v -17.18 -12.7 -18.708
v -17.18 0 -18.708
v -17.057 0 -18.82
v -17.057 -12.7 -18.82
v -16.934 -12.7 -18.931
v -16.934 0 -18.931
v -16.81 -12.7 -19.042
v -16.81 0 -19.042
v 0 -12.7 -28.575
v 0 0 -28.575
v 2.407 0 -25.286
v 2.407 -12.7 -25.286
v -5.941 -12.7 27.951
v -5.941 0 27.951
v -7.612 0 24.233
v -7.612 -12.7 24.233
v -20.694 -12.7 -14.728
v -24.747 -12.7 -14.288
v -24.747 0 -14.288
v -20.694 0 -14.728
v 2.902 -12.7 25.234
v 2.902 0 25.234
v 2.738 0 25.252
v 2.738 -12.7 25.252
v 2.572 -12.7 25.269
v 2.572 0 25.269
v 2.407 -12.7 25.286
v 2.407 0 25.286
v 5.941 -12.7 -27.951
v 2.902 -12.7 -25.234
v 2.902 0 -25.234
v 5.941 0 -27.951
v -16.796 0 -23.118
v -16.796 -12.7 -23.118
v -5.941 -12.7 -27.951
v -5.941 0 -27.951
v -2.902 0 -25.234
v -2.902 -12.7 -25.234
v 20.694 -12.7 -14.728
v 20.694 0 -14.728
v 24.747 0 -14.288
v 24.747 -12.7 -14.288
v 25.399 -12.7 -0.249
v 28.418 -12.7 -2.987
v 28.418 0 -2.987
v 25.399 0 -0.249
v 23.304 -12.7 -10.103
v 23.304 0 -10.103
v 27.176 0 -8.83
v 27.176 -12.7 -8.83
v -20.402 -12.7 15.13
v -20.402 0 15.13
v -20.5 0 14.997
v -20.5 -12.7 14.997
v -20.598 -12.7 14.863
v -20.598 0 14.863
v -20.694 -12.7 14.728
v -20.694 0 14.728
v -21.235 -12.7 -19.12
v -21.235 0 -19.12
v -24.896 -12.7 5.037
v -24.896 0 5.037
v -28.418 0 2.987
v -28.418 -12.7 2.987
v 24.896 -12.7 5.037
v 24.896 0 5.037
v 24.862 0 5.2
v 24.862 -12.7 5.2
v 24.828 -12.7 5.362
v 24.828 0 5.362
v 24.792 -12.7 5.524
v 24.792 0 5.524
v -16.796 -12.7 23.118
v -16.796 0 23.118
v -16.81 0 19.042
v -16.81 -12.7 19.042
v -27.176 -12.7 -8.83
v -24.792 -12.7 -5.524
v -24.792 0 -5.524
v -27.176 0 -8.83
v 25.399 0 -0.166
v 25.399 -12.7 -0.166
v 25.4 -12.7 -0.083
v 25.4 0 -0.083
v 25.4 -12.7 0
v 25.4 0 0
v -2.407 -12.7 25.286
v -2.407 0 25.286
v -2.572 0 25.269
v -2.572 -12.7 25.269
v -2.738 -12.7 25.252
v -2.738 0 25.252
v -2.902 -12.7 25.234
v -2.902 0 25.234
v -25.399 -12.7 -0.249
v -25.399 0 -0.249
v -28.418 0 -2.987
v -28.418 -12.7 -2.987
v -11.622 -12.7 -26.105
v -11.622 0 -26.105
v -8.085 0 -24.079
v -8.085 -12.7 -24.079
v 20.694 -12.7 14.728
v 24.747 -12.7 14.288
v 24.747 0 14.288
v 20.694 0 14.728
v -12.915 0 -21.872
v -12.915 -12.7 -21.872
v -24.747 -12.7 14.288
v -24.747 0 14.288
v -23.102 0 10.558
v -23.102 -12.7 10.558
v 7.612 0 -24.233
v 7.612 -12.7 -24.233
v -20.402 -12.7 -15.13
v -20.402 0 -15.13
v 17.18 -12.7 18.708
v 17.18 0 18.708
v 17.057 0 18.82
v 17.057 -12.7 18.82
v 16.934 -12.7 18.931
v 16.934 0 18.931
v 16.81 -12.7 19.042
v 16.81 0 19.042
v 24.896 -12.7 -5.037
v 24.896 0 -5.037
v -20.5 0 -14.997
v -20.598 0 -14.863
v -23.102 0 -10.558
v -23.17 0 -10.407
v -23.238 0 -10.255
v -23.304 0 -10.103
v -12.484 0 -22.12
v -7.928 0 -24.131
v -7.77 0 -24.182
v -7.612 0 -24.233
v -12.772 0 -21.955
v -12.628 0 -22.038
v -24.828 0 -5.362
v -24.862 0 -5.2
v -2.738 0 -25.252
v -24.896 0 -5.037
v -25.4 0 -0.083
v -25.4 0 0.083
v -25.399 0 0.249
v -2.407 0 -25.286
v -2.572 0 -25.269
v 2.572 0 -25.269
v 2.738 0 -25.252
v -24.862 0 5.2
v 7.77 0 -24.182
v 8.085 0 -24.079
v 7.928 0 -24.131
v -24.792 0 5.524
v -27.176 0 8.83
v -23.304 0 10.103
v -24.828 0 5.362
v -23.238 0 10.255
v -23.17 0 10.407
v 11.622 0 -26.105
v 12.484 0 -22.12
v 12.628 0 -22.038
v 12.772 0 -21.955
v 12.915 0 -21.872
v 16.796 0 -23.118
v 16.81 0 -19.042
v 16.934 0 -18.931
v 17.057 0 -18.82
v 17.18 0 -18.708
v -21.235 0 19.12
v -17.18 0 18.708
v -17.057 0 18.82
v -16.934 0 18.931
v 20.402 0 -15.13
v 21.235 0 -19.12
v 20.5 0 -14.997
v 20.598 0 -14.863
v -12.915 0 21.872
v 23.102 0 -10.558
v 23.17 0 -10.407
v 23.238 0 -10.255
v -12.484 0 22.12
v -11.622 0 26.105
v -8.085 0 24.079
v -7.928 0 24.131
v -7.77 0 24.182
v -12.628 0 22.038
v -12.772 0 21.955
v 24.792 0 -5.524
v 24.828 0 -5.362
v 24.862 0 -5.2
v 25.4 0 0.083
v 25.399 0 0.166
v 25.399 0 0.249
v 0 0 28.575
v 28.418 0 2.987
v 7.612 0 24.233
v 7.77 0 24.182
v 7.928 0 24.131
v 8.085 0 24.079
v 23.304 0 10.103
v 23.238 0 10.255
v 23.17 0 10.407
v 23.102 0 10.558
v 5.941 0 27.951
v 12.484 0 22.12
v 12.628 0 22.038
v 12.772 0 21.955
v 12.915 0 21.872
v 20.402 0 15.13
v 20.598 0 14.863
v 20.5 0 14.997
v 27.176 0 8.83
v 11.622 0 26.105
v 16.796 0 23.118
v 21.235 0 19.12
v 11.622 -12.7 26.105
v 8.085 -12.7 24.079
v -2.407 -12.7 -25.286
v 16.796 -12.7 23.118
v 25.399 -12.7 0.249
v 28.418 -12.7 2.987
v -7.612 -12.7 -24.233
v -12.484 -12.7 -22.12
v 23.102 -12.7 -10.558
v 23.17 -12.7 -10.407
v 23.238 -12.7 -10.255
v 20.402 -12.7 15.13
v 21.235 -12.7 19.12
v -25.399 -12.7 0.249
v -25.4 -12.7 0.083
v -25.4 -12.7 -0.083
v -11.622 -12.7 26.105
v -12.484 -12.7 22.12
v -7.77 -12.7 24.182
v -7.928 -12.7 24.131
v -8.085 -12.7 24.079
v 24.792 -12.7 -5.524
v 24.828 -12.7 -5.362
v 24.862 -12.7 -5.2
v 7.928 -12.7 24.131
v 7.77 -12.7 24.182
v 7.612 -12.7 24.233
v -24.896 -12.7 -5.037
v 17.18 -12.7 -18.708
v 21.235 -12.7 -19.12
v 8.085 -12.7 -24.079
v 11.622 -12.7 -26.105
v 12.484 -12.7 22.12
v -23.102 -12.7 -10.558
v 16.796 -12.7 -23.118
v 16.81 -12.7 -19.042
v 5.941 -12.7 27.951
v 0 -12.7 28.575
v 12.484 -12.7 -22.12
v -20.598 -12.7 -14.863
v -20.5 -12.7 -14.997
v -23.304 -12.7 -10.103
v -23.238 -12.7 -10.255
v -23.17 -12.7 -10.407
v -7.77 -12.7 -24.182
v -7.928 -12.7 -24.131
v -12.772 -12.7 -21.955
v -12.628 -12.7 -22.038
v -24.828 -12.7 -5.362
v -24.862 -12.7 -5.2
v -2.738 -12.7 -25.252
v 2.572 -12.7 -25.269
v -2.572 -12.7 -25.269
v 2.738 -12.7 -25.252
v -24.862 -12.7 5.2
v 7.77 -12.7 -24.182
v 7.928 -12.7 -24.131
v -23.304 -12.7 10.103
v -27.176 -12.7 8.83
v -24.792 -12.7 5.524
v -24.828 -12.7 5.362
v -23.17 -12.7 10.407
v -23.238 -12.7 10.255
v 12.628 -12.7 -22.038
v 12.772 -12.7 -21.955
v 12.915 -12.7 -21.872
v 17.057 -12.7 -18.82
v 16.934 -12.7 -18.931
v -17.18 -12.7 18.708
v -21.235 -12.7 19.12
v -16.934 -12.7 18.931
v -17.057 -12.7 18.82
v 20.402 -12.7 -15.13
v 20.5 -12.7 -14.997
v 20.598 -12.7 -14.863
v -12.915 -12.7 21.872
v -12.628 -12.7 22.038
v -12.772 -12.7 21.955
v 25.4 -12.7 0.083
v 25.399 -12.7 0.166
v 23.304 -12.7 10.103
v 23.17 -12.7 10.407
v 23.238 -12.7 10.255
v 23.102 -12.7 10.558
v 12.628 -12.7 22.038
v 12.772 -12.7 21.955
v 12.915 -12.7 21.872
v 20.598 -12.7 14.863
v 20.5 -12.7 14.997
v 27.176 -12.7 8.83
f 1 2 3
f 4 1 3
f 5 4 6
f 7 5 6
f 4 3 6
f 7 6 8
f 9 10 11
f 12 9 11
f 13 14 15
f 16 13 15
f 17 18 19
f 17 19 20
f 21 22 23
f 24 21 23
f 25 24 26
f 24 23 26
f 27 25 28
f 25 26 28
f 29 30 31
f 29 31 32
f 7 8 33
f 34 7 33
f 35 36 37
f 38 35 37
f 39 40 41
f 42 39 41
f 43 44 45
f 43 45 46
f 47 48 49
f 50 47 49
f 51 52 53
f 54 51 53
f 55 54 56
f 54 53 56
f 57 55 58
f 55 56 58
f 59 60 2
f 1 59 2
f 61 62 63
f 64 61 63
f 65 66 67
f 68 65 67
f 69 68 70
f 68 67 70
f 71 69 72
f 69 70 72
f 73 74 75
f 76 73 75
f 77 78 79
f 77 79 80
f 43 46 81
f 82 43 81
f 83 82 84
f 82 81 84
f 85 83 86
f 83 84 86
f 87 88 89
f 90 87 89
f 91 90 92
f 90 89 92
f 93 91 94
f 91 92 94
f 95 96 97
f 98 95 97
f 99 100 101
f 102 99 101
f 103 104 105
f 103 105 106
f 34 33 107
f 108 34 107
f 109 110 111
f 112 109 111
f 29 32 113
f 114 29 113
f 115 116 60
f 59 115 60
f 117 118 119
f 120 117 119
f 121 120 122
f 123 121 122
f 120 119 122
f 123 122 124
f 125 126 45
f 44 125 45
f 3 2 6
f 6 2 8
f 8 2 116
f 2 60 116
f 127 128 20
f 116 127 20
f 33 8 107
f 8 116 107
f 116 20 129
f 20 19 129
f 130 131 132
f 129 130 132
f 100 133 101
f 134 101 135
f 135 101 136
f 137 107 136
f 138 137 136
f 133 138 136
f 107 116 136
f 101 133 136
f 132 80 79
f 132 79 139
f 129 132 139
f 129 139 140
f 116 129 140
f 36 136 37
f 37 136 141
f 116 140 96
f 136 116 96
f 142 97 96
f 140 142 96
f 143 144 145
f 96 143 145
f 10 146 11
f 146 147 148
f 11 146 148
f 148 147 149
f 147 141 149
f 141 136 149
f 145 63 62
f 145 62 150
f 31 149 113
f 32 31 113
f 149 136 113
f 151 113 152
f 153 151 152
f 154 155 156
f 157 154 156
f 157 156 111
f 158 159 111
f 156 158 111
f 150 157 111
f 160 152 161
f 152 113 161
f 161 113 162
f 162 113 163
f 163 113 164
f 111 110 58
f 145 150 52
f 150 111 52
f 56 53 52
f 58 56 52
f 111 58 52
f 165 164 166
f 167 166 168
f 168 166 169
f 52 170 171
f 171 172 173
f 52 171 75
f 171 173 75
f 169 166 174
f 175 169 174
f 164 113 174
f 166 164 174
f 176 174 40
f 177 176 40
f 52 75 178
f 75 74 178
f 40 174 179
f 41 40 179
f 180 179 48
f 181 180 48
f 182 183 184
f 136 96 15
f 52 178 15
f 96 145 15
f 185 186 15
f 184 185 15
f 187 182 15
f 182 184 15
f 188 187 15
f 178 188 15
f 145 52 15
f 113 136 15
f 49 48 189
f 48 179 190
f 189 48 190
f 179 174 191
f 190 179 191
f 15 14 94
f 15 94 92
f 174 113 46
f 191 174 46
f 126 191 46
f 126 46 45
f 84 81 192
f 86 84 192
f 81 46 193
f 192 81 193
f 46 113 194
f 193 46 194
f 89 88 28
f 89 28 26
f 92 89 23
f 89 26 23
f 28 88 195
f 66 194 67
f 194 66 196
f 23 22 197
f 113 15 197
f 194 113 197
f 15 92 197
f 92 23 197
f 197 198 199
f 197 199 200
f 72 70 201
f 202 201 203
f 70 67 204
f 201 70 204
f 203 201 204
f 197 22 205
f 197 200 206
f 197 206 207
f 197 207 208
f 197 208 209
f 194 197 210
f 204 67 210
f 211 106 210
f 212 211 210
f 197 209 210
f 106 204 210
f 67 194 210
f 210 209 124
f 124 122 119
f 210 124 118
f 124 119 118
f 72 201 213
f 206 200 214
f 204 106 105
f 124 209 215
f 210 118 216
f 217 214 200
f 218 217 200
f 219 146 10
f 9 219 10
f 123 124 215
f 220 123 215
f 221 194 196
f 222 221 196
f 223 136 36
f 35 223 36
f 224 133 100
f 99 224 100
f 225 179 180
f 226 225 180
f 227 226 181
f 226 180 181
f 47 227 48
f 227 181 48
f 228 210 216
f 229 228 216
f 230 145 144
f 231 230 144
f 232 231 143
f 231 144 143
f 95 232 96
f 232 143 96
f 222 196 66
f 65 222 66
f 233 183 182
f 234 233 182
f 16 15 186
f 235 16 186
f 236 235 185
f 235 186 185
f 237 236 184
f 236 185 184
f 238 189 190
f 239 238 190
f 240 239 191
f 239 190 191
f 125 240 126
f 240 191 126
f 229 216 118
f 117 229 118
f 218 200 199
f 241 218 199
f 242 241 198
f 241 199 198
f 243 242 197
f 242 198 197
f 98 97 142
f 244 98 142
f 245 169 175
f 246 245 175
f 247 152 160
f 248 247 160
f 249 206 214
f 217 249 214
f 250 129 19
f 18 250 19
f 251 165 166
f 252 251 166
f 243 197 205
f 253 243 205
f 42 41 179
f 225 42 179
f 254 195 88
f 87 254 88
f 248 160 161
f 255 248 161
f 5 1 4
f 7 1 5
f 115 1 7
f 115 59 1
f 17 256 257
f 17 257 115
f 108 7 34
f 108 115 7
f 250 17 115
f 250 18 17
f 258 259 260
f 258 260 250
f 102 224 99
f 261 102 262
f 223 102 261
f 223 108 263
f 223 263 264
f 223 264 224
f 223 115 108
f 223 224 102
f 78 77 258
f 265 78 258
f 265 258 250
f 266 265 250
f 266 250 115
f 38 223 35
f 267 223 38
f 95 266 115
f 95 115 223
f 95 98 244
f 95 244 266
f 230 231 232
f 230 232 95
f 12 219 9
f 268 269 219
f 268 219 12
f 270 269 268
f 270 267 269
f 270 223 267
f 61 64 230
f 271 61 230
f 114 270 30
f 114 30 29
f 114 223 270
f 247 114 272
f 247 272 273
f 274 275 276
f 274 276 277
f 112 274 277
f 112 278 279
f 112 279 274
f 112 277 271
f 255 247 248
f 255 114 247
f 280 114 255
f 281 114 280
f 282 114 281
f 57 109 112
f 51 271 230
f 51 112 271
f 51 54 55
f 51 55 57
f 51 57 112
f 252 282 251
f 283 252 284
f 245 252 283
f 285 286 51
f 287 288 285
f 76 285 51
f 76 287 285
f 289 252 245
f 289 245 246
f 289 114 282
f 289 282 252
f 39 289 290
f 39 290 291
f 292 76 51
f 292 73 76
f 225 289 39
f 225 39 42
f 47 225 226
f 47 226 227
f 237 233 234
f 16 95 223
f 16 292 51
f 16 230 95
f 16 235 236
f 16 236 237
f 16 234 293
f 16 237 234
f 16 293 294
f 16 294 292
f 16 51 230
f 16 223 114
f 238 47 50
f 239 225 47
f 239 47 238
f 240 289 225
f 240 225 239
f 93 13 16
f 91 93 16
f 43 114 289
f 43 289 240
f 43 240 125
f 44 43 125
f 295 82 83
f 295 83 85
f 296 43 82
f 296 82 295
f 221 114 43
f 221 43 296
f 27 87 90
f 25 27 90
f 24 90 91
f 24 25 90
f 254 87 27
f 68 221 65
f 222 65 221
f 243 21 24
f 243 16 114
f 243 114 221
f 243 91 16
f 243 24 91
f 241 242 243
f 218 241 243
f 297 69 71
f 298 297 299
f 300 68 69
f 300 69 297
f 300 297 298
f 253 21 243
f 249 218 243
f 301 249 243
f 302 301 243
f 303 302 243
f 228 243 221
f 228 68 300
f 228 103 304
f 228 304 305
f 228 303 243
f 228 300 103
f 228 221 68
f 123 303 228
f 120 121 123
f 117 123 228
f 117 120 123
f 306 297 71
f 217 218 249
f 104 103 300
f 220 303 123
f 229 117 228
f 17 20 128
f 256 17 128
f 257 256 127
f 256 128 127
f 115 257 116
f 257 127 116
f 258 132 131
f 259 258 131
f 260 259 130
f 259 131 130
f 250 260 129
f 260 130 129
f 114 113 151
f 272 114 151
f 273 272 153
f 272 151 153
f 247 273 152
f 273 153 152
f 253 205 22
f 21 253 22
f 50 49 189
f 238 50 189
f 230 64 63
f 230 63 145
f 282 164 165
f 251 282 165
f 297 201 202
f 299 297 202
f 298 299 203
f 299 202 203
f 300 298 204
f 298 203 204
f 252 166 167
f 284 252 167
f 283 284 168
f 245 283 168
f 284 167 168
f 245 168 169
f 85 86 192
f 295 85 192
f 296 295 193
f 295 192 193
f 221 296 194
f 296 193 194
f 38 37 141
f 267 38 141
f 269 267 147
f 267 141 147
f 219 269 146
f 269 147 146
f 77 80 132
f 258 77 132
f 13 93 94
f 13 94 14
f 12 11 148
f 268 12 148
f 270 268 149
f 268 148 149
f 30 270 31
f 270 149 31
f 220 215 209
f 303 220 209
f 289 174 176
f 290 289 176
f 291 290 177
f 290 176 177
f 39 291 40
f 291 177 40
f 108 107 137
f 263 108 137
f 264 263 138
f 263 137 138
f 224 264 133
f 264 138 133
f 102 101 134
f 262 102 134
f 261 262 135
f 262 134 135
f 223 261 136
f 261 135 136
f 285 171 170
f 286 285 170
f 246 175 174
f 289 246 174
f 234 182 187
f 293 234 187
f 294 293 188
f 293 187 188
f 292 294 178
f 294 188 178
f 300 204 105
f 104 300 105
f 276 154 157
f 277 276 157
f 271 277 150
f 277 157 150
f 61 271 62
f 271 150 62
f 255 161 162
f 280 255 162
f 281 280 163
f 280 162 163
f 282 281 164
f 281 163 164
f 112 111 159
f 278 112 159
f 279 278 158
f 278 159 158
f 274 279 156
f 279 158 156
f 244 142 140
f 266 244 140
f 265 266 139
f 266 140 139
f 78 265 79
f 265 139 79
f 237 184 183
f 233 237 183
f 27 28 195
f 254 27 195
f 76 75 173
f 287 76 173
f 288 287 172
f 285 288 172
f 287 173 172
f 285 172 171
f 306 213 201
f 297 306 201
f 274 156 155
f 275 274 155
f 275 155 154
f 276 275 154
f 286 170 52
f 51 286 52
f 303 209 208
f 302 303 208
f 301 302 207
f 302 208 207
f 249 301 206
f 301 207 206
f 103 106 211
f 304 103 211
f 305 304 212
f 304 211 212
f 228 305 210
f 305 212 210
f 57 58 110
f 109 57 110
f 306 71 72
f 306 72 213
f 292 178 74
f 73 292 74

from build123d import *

# Parameters (mm, degrees)
F1_DEPTH = 12.7


with BuildPart() as f1:
    # F0 (on Front) → F1 (new body)
    with BuildSketch(Plane.XZ):
        with BuildLine():
            ThreePointArc((25.39878, -0.248902), (25.399695, -0.124452), (25.4, 0))
            ThreePointArc((25.4, 0), (25.399695, 0.124452), (25.39878, 0.248902))
            ThreePointArc((25.39878, 0.248902), (25.260856, 2.655023), (24.895506, 5.037241))
            ThreePointArc((24.895506, 5.037241), (24.844949, 5.280957), (24.792007, 5.524166))
            ThreePointArc((24.792007, 5.524166), (24.156836, 7.849032), (23.304178, 10.103232))
            ThreePointArc((23.304178, 10.103232), (23.204055, 10.331111), (23.101703, 10.557998))
            ThreePointArc((23.101703, 10.557998), (21.997045, 12.7), (20.694346, 14.727663))
            ThreePointArc((20.694346, 14.727663), (20.549032, 14.929745), (20.401744, 15.130394))
            ThreePointArc((20.401744, 15.130394), (18.875879, 16.995917), (17.180071, 18.708425))
            ThreePointArc((17.180071, 18.708425), (16.995917, 18.875879), (16.810131, 19.04152))
            ThreePointArc((16.810131, 19.04152), (14.929745, 20.549032), (12.914945, 21.871538))
            ThreePointArc((12.914945, 21.871538), (12.7, 21.997045), (12.483835, 22.12044))
            ThreePointArc((12.483835, 22.12044), (10.331111, 23.204055), (8.085374, 24.078761))
            ThreePointArc((8.085374, 24.078761), (7.849032, 24.156836), (7.611935, 24.23259))
            ThreePointArc((7.611935, 24.23259), (5.280957, 24.844949), (2.902434, 25.233626))
            ThreePointArc((2.902434, 25.233626), (2.655023, 25.260856), (2.407357, 25.285661))
            ThreePointArc((2.407357, 25.285661), (0, 25.4), (-2.407357, 25.285661))
            ThreePointArc((-2.407357, 25.285661), (-2.655023, 25.260856), (-2.902434, 25.233626))
            ThreePointArc((-2.902434, 25.233626), (-5.280957, 24.844949), (-7.611935, 24.23259))
            ThreePointArc((-7.611935, 24.23259), (-7.849032, 24.156836), (-8.085374, 24.078761))
            ThreePointArc((-8.085374, 24.078761), (-10.331111, 23.204055), (-12.483835, 22.12044))
            ThreePointArc((-12.483835, 22.12044), (-12.7, 21.997045), (-12.914945, 21.871538))
            ThreePointArc((-12.914945, 21.871538), (-14.929745, 20.549032), (-16.810131, 19.04152))
            ThreePointArc((-16.810131, 19.04152), (-16.995917, 18.875879), (-17.180071, 18.708425))
            ThreePointArc((-17.180071, 18.708425), (-18.875879, 16.995917), (-20.401744, 15.130394))
            ThreePointArc((-20.401744, 15.130394), (-20.549032, 14.929745), (-20.694346, 14.727663))
            ThreePointArc((-20.694346, 14.727663), (-21.997045, 12.7), (-23.101703, 10.557998))
            ThreePointArc((-23.101703, 10.557998), (-23.204055, 10.331111), (-23.304178, 10.103232))
            ThreePointArc((-23.304178, 10.103232), (-24.156836, 7.849032), (-24.792007, 5.524166))
            ThreePointArc((-24.792007, 5.524166), (-24.844949, 5.280957), (-24.895506, 5.037241))
            ThreePointArc((-24.895506, 5.037241), (-25.260856, 2.655023), (-25.39878, 0.248902))
            ThreePointArc((-25.39878, 0.248902), (-25.4, 0), (-25.39878, -0.248902))
            ThreePointArc((-25.39878, -0.248902), (-25.260856, -2.655023), (-24.895506, -5.037241))
            ThreePointArc((-24.895506, -5.037241), (-24.844949, -5.280957), (-24.792007, -5.524166))
            ThreePointArc((-24.792007, -5.524166), (-24.156836, -7.849032), (-23.304178, -10.103232))
            ThreePointArc((-23.304178, -10.103232), (-23.204055, -10.331111), (-23.101703, -10.557998))
            ThreePointArc((-23.101703, -10.557998), (-21.997045, -12.7), (-20.694346, -14.727663))
            ThreePointArc((-20.694346, -14.727663), (-20.549032, -14.929745), (-20.401744, -15.130394))
            ThreePointArc((-20.401744, -15.130394), (-18.875879, -16.995917), (-17.180071, -18.708425))
            ThreePointArc((-17.180071, -18.708425), (-16.995917, -18.875879), (-16.810131, -19.04152))
            ThreePointArc((-16.810131, -19.04152), (-14.929745, -20.549032), (-12.914945, -21.871538))
            ThreePointArc((-12.914945, -21.871538), (-12.7, -21.997045), (-12.483835, -22.12044))
            ThreePointArc((-12.483835, -22.12044), (-10.331111, -23.204055), (-8.085374, -24.078761))
            ThreePointArc((-8.085374, -24.078761), (-7.849032, -24.156836), (-7.611935, -24.23259))
            ThreePointArc((-7.611935, -24.23259), (-5.280957, -24.844949), (-2.902434, -25.233626))
            ThreePointArc((-2.902434, -25.233626), (-2.655023, -25.260856), (-2.407357, -25.285661))
            ThreePointArc((-2.407357, -25.285661), (0, -25.4), (2.407357, -25.285661))
            ThreePointArc((2.407357, -25.285661), (2.655023, -25.260856), (2.902434, -25.233626))
            ThreePointArc((2.902434, -25.233626), (5.280957, -24.844949), (7.611935, -24.23259))
            ThreePointArc((7.611935, -24.23259), (7.849032, -24.156836), (8.085374, -24.078761))
            ThreePointArc((8.085374, -24.078761), (10.331111, -23.204055), (12.483835, -22.12044))
            ThreePointArc((12.483835, -22.12044), (12.7, -21.997045), (12.914945, -21.871538))
            ThreePointArc((12.914945, -21.871538), (14.929745, -20.549032), (16.810131, -19.04152))
            ThreePointArc((16.810131, -19.04152), (16.995917, -18.875879), (17.180071, -18.708425))
            ThreePointArc((17.180071, -18.708425), (18.875879, -16.995917), (20.401744, -15.130394))
            ThreePointArc((20.401744, -15.130394), (20.549032, -14.929745), (20.694346, -14.727663))
            ThreePointArc((20.694346, -14.727663), (21.997045, -12.7), (23.101703, -10.557998))
            ThreePointArc((23.101703, -10.557998), (23.204055, -10.331111), (23.304178, -10.103232))
            ThreePointArc((23.304178, -10.103232), (24.156836, -7.849032), (24.792007, -5.524166))
            ThreePointArc((24.792007, -5.524166), (24.844949, -5.280957), (24.895506, -5.037241))
            ThreePointArc((24.895506, -5.037241), (25.260856, -2.655023), (25.39878, -0.248902))
        make_face()
        with BuildLine():
            Line((-28.418463, -2.986901), (-24.895506, -5.037241))
            ThreePointArc((-24.895506, -5.037241), (-25.260856, -2.655023), (-25.39878, -0.248902))
            Line((-25.39878, -0.248902), (-28.418463, -2.986901))
        make_face()
        with BuildLine():
            ThreePointArc((-25.39878, 0.248902), (-25.260856, 2.655023), (-24.895506, 5.037241))
            Line((-24.895506, 5.037241), (-28.418463, 2.986901))
            Line((-28.418463, 2.986901), (-25.39878, 0.248902))
        make_face()
        with BuildLine():
            ThreePointArc((-24.792007, 5.524166), (-24.156836, 7.849032), (-23.304178, 10.103232))
            Line((-23.304178, 10.103232), (-27.17644, 8.830161))
            Line((-27.17644, 8.830161), (-24.792007, 5.524166))
        make_face()
        with BuildLine():
            ThreePointArc((-23.101703, 10.557998), (-21.997045, 12.7), (-20.694346, 14.727663))
            Line((-20.694346, 14.727663), (-24.746676, 14.2875))
            Line((-24.746676, 14.2875), (-23.101703, 10.557998))
        make_face()
        with BuildLine():
            ThreePointArc((-20.401744, 15.130394), (-18.875879, 16.995917), (-17.180071, 18.708425))
            Line((-17.180071, 18.708425), (-21.235363, 19.120407))
            Line((-21.235363, 19.120407), (-20.401744, 15.130394))
        make_face()
        with BuildLine():
            ThreePointArc((-16.810131, 19.04152), (-14.929745, 20.549032), (-12.914945, 21.871538))
            Line((-12.914945, 21.871538), (-16.795964, 23.117661))
            Line((-16.795964, 23.117661), (-16.810131, 19.04152))
        make_face()
        with BuildLine():
            ThreePointArc((-12.483835, 22.12044), (-10.331111, 23.204055), (-8.085374, 24.078761))
            Line((-8.085374, 24.078761), (-11.6225, 26.104561))
            Line((-11.6225, 26.104561), (-12.483835, 22.12044))
        make_face()
        with BuildLine():
            ThreePointArc((-7.611935, 24.23259), (-5.280957, 24.844949), (-2.902434, 25.233626))
            Line((-2.902434, 25.233626), (-5.941077, 27.950568))
            Line((-5.941077, 27.950568), (-7.611935, 24.23259))
        make_face()
        with BuildLine():
            ThreePointArc((-2.407357, 25.285661), (0, 25.4), (2.407357, 25.285661))
            Line((2.407357, 25.285661), (0, 28.575))
            Line((0, 28.575), (-2.407357, 25.285661))
        make_face()
        with BuildLine():
            ThreePointArc((2.902434, 25.233626), (5.280957, 24.844949), (7.611935, 24.23259))
            Line((7.611935, 24.23259), (5.941077, 27.950568))
            Line((5.941077, 27.950568), (2.902434, 25.233626))
        make_face()
        with BuildLine():
            ThreePointArc((12.914945, 21.871538), (14.929745, 20.549032), (16.810131, 19.04152))
            Line((16.810131, 19.04152), (16.795964, 23.117661))
            Line((16.795964, 23.117661), (12.914945, 21.871538))
        make_face()
        with BuildLine():
            ThreePointArc((17.180071, 18.708425), (18.875879, 16.995917), (20.401744, 15.130394))
            Line((20.401744, 15.130394), (21.235363, 19.120407))
            Line((21.235363, 19.120407), (17.180071, 18.708425))
        make_face()
        with BuildLine():
            ThreePointArc((20.694346, 14.727663), (21.997045, 12.7), (23.101703, 10.557998))
            Line((23.101703, 10.557998), (24.746676, 14.2875))
            Line((24.746676, 14.2875), (20.694346, 14.727663))
        make_face()
        with BuildLine():
            ThreePointArc((23.304178, 10.103232), (24.156836, 7.849032), (24.792007, 5.524166))
            Line((24.792007, 5.524166), (27.17644, 8.830161))
            Line((27.17644, 8.830161), (23.304178, 10.103232))
        make_face()
        with BuildLine():
            ThreePointArc((8.085374, 24.078761), (10.331111, 23.204055), (12.483835, 22.12044))
            Line((12.483835, 22.12044), (11.6225, 26.104561))
            Line((11.6225, 26.104561), (8.085374, 24.078761))
        make_face()
        with BuildLine():
            ThreePointArc((24.895506, 5.037241), (25.260856, 2.655023), (25.39878, 0.248902))
            Line((25.39878, 0.248902), (28.418463, 2.986901))
            Line((28.418463, 2.986901), (24.895506, 5.037241))
        make_face()
        with BuildLine():
            Line((28.418463, -2.986901), (25.39878, -0.248902))
            ThreePointArc((25.39878, -0.248902), (25.260856, -2.655023), (24.895506, -5.037241))
            Line((24.895506, -5.037241), (28.418463, -2.986901))
        make_face()
        with BuildLine():
            Line((27.17644, -8.830161), (24.792007, -5.524166))
            ThreePointArc((24.792007, -5.524166), (24.156836, -7.849032), (23.304178, -10.103232))
            Line((23.304178, -10.103232), (27.17644, -8.830161))
        make_face()
        with BuildLine():
            Line((24.746676, -14.2875), (23.101703, -10.557998))
            ThreePointArc((23.101703, -10.557998), (21.997045, -12.7), (20.694346, -14.727663))
            Line((20.694346, -14.727663), (24.746676, -14.2875))
        make_face()
        with BuildLine():
            Line((21.235363, -19.120407), (20.401744, -15.130394))
            ThreePointArc((20.401744, -15.130394), (18.875879, -16.995917), (17.180071, -18.708425))
            Line((17.180071, -18.708425), (21.235363, -19.120407))
        make_face()
        with BuildLine():
            Line((11.6225, -26.104561), (12.483835, -22.12044))
            ThreePointArc((12.483835, -22.12044), (10.331111, -23.204055), (8.085374, -24.078761))
            Line((8.085374, -24.078761), (11.6225, -26.104561))
        make_face()
        with BuildLine():
            Line((5.941077, -27.950568), (7.611935, -24.23259))
            ThreePointArc((7.611935, -24.23259), (5.280957, -24.844949), (2.902434, -25.233626))
            Line((2.902434, -25.233626), (5.941077, -27.950568))
        make_face()
        with BuildLine():
            Line((0, -28.575), (2.407357, -25.285661))
            ThreePointArc((2.407357, -25.285661), (0, -25.4), (-2.407357, -25.285661))
            Line((-2.407357, -25.285661), (0, -28.575))
        make_face()
        with BuildLine():
            Line((-5.941077, -27.950568), (-2.902434, -25.233626))
            ThreePointArc((-2.902434, -25.233626), (-5.280957, -24.844949), (-7.611935, -24.23259))
            Line((-7.611935, -24.23259), (-5.941077, -27.950568))
        make_face()
        with BuildLine():
            Line((-11.6225, -26.104561), (-8.085374, -24.078761))
            ThreePointArc((-8.085374, -24.078761), (-10.331111, -23.204055), (-12.483835, -22.12044))
            Line((-12.483835, -22.12044), (-11.6225, -26.104561))
        make_face()
        with BuildLine():
            Line((-16.795964, -23.117661), (-12.914945, -21.871538))
            ThreePointArc((-12.914945, -21.871538), (-14.929745, -20.549032), (-16.810131, -19.04152))
            Line((-16.810131, -19.04152), (-16.795964, -23.117661))
        make_face()
        with BuildLine():
            Line((-21.235363, -19.120407), (-17.180071, -18.708425))
            ThreePointArc((-17.180071, -18.708425), (-18.875879, -16.995917), (-20.401744, -15.130394))
            Line((-20.401744, -15.130394), (-21.235363, -19.120407))
        make_face()
        with BuildLine():
            Line((-24.746676, -14.2875), (-20.694346, -14.727663))
            ThreePointArc((-20.694346, -14.727663), (-21.997045, -12.7), (-23.101703, -10.557998))
            Line((-23.101703, -10.557998), (-24.746676, -14.2875))
        make_face()
        with BuildLine():
            Line((-27.17644, -8.830161), (-23.304178, -10.103232))
            ThreePointArc((-23.304178, -10.103232), (-24.156836, -7.849032), (-24.792007, -5.524166))
            Line((-24.792007, -5.524166), (-27.17644, -8.830161))
        make_face()
        with BuildLine():
            Line((16.795964, -23.117661), (16.810131, -19.04152))
            ThreePointArc((16.810131, -19.04152), (14.929745, -20.549032), (12.914945, -21.871538))
            Line((12.914945, -21.871538), (16.795964, -23.117661))
        make_face()
    extrude(amount=F1_DEPTH)


solid = f1.part
